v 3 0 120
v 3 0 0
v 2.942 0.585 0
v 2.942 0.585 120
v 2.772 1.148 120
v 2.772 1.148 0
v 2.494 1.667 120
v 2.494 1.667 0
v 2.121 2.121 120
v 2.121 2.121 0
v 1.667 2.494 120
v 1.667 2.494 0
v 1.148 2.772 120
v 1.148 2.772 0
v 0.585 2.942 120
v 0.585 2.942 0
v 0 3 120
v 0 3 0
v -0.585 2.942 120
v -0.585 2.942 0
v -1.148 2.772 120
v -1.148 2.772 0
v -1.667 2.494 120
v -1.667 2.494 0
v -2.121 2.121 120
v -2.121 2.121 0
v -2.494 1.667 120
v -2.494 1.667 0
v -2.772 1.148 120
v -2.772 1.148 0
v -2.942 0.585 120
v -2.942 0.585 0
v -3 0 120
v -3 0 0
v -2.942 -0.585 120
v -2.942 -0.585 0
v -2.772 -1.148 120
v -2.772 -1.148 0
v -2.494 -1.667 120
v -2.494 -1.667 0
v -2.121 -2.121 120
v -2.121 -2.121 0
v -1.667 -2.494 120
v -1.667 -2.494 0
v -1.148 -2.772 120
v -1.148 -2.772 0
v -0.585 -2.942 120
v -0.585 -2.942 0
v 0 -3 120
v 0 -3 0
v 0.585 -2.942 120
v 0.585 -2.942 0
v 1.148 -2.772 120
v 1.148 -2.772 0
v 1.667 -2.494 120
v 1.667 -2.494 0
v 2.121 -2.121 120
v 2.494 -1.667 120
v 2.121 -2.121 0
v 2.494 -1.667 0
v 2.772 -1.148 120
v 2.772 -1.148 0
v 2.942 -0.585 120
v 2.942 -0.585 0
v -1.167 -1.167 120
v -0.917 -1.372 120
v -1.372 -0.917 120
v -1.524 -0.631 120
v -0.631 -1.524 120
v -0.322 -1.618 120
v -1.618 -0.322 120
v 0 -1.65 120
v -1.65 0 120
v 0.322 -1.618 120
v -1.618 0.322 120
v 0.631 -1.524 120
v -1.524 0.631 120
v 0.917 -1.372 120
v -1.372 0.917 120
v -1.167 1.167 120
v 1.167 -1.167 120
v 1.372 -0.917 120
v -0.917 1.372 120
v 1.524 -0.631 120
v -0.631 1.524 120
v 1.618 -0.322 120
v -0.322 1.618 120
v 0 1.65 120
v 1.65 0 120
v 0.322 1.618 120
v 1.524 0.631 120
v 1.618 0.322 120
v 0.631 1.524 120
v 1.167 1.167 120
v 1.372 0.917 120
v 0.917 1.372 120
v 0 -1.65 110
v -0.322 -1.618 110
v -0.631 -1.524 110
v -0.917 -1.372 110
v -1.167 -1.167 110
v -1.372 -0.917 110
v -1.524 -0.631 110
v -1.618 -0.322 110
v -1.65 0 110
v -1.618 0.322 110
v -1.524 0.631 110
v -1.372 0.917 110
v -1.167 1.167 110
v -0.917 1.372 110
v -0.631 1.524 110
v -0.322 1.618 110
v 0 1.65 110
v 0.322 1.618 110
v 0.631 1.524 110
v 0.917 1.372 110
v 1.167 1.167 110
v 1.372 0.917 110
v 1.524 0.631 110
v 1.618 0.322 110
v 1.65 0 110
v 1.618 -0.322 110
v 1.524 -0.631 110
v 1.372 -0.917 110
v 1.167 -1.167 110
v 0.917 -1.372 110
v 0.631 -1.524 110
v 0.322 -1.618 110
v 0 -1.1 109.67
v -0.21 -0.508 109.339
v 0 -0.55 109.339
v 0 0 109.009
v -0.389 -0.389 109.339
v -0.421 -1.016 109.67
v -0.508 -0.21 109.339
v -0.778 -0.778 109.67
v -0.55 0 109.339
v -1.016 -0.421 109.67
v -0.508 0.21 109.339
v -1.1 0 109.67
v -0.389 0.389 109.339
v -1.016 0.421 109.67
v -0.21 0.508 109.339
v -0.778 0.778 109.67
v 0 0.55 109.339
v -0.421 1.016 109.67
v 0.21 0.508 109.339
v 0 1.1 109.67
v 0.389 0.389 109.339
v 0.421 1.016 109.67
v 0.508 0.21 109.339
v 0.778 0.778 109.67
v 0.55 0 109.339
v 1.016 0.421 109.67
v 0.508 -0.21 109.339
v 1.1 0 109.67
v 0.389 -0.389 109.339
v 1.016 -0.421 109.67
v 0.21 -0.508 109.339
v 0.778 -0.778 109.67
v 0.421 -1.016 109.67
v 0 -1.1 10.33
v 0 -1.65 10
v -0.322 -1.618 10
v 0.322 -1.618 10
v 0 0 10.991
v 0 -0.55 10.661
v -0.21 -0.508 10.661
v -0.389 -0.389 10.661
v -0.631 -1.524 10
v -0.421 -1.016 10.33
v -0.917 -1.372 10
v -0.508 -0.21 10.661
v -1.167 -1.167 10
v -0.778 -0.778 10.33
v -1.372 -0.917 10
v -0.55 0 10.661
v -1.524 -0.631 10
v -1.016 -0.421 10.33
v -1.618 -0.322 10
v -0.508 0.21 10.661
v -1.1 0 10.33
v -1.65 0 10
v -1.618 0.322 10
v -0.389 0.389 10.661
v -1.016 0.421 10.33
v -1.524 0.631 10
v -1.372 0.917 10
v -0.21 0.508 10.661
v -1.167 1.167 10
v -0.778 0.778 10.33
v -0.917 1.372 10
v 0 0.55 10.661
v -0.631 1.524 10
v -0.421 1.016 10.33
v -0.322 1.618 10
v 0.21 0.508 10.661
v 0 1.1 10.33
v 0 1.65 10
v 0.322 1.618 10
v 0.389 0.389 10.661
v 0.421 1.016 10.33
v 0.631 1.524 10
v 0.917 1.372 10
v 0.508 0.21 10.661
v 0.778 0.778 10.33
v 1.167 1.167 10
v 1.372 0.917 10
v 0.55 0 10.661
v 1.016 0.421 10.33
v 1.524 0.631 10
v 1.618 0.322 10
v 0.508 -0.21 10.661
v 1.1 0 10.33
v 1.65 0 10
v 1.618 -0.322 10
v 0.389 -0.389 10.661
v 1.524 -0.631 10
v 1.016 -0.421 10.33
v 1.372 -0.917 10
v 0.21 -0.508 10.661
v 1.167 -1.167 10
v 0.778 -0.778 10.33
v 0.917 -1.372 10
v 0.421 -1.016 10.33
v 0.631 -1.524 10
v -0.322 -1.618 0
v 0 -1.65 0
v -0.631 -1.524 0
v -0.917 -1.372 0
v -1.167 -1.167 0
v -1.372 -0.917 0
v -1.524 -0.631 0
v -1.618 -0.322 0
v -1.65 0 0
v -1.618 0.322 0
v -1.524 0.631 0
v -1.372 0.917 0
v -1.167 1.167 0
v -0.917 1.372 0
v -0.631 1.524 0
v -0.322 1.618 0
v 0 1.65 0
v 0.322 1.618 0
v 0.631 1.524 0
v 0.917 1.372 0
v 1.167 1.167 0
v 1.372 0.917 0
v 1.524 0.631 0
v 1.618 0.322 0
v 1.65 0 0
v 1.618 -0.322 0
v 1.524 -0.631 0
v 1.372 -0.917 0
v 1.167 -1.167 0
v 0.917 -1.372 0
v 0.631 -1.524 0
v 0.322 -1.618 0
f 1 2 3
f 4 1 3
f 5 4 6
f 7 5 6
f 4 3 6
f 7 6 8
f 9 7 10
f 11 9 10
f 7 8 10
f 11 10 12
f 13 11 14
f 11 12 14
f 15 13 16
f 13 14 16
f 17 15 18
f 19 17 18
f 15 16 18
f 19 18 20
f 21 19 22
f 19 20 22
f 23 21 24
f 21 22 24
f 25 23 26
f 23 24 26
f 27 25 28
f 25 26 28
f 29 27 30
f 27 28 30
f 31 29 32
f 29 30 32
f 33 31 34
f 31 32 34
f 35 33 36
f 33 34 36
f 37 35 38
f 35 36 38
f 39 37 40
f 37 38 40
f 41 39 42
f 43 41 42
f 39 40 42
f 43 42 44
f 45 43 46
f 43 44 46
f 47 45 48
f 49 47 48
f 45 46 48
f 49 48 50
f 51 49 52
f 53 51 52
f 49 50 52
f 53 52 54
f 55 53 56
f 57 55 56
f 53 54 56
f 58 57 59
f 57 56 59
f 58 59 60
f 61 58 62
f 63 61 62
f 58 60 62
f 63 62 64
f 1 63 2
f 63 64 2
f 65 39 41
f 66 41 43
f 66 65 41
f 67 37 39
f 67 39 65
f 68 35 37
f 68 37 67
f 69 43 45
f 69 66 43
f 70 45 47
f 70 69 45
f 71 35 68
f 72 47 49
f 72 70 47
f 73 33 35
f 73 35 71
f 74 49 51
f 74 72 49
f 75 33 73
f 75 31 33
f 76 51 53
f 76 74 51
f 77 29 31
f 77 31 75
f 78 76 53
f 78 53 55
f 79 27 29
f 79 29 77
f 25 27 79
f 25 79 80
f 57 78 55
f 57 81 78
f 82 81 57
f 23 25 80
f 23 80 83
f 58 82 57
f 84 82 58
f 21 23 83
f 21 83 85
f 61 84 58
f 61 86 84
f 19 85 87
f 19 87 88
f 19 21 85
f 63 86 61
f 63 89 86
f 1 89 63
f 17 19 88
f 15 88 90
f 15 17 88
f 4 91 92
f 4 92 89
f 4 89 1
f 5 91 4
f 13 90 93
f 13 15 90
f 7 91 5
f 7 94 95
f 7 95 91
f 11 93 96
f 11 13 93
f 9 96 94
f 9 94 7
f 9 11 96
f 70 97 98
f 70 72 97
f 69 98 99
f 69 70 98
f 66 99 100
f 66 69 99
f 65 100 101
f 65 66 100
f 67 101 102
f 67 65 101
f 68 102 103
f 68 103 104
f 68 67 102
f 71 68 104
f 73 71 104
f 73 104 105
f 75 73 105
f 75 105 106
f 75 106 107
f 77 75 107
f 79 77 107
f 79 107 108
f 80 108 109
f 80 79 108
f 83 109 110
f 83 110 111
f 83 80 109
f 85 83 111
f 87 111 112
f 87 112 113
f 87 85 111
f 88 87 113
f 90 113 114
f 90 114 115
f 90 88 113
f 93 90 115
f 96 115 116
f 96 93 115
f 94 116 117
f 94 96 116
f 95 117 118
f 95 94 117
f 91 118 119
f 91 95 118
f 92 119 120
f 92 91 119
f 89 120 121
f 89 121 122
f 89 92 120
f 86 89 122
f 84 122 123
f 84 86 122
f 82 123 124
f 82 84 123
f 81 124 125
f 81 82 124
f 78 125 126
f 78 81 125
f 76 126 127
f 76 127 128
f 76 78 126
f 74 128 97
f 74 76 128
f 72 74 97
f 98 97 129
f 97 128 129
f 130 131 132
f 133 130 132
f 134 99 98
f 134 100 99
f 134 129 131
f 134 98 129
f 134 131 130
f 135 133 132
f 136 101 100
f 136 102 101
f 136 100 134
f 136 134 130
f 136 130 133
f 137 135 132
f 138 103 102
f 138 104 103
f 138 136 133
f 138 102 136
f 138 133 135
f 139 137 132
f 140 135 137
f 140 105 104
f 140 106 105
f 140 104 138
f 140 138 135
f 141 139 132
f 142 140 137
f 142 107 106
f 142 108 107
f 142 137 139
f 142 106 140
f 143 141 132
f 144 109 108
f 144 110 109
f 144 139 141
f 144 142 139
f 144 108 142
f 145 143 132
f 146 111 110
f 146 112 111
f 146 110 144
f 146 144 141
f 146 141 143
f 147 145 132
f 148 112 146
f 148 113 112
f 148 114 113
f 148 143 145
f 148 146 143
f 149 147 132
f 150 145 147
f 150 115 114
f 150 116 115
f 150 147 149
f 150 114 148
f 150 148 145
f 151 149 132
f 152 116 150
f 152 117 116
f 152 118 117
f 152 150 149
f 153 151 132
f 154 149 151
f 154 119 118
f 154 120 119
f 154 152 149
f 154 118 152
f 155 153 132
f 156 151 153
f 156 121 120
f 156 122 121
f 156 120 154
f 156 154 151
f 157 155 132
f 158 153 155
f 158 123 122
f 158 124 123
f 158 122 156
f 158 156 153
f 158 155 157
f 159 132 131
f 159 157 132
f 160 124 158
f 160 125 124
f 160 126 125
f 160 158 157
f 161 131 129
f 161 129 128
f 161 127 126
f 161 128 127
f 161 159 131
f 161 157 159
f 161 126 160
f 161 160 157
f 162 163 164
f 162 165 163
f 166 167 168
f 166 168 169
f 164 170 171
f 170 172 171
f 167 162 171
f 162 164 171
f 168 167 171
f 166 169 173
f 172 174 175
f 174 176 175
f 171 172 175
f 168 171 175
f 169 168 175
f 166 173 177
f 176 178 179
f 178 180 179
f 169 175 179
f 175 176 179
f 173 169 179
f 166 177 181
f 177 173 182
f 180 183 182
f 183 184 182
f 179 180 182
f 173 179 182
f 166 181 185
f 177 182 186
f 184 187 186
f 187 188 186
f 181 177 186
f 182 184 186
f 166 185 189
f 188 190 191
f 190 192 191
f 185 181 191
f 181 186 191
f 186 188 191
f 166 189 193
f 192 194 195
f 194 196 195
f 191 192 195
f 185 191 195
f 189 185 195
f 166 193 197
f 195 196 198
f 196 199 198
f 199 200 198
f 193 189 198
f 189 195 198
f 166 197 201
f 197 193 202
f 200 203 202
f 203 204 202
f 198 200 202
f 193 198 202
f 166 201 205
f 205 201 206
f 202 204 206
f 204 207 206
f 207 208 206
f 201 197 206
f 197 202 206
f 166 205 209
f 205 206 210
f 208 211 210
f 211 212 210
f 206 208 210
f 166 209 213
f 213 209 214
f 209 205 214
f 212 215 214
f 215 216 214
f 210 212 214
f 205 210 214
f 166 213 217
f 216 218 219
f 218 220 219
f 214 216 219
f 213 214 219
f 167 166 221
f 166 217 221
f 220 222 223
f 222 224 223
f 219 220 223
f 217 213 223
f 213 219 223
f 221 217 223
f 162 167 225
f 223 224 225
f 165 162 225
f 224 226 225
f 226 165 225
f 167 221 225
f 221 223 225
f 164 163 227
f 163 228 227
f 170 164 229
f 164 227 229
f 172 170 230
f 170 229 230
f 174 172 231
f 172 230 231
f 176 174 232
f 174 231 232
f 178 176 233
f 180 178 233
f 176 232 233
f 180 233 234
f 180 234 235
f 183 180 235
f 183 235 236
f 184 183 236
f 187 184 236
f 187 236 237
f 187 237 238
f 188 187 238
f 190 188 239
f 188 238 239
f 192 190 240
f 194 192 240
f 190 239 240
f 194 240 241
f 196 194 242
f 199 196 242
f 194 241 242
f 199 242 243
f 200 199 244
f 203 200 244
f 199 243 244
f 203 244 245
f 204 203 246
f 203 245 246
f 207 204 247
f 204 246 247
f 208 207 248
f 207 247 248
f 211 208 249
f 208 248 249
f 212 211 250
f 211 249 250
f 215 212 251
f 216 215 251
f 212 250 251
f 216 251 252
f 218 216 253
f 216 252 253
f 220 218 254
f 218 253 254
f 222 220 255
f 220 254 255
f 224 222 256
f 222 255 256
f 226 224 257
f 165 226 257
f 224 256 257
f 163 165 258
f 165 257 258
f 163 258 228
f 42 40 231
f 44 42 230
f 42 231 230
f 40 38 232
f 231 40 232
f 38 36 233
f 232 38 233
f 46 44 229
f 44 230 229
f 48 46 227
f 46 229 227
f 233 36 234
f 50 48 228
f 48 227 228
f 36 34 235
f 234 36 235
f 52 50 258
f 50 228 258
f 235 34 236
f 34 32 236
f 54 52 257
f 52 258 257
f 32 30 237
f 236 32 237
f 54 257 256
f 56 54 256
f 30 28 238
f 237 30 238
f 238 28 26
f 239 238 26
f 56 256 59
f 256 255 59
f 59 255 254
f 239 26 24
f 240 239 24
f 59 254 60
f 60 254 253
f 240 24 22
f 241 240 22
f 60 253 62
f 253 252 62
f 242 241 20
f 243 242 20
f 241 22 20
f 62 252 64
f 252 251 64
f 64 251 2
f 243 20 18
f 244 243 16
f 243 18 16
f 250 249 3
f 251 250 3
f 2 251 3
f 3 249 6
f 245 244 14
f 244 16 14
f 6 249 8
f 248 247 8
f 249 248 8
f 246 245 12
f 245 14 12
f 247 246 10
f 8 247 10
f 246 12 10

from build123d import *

# Parameters (mm, degrees)
SKETCH1_R           = 3
BOSS_EXTRUDE1_DEPTH = 120


with BuildPart() as part:
    # Sketch1 → Boss-Extrude1 (new body)
    with BuildSketch(Plane.XY):
        Circle(SKETCH1_R)
    extrude(amount=BOSS_EXTRUDE1_DEPTH)

    # Sketch3 → M4x0.7 Tapped Hole1 (revolve, cut)
    with BuildSketch(Plane(origin=(0, 0, 120), x_dir=(0, -1, 0), z_dir=(1, 0, 0))):
        Polygon((0, 0), (0, 10.991420021), (1.65, 10), (1.65, 0), align=None)
    m4x0_7_tapped_hole1 = revolve(axis=Axis((0, 0, 126.35), (0, 0, -1)), mode=Mode.SUBTRACT)

    # Mirror1: M4x0.7 Tapped Hole1 across plane
    add(m4x0_7_tapped_hole1.mirror(Plane.XY.offset(60)), mode=Mode.SUBTRACT)


solid = part.part
